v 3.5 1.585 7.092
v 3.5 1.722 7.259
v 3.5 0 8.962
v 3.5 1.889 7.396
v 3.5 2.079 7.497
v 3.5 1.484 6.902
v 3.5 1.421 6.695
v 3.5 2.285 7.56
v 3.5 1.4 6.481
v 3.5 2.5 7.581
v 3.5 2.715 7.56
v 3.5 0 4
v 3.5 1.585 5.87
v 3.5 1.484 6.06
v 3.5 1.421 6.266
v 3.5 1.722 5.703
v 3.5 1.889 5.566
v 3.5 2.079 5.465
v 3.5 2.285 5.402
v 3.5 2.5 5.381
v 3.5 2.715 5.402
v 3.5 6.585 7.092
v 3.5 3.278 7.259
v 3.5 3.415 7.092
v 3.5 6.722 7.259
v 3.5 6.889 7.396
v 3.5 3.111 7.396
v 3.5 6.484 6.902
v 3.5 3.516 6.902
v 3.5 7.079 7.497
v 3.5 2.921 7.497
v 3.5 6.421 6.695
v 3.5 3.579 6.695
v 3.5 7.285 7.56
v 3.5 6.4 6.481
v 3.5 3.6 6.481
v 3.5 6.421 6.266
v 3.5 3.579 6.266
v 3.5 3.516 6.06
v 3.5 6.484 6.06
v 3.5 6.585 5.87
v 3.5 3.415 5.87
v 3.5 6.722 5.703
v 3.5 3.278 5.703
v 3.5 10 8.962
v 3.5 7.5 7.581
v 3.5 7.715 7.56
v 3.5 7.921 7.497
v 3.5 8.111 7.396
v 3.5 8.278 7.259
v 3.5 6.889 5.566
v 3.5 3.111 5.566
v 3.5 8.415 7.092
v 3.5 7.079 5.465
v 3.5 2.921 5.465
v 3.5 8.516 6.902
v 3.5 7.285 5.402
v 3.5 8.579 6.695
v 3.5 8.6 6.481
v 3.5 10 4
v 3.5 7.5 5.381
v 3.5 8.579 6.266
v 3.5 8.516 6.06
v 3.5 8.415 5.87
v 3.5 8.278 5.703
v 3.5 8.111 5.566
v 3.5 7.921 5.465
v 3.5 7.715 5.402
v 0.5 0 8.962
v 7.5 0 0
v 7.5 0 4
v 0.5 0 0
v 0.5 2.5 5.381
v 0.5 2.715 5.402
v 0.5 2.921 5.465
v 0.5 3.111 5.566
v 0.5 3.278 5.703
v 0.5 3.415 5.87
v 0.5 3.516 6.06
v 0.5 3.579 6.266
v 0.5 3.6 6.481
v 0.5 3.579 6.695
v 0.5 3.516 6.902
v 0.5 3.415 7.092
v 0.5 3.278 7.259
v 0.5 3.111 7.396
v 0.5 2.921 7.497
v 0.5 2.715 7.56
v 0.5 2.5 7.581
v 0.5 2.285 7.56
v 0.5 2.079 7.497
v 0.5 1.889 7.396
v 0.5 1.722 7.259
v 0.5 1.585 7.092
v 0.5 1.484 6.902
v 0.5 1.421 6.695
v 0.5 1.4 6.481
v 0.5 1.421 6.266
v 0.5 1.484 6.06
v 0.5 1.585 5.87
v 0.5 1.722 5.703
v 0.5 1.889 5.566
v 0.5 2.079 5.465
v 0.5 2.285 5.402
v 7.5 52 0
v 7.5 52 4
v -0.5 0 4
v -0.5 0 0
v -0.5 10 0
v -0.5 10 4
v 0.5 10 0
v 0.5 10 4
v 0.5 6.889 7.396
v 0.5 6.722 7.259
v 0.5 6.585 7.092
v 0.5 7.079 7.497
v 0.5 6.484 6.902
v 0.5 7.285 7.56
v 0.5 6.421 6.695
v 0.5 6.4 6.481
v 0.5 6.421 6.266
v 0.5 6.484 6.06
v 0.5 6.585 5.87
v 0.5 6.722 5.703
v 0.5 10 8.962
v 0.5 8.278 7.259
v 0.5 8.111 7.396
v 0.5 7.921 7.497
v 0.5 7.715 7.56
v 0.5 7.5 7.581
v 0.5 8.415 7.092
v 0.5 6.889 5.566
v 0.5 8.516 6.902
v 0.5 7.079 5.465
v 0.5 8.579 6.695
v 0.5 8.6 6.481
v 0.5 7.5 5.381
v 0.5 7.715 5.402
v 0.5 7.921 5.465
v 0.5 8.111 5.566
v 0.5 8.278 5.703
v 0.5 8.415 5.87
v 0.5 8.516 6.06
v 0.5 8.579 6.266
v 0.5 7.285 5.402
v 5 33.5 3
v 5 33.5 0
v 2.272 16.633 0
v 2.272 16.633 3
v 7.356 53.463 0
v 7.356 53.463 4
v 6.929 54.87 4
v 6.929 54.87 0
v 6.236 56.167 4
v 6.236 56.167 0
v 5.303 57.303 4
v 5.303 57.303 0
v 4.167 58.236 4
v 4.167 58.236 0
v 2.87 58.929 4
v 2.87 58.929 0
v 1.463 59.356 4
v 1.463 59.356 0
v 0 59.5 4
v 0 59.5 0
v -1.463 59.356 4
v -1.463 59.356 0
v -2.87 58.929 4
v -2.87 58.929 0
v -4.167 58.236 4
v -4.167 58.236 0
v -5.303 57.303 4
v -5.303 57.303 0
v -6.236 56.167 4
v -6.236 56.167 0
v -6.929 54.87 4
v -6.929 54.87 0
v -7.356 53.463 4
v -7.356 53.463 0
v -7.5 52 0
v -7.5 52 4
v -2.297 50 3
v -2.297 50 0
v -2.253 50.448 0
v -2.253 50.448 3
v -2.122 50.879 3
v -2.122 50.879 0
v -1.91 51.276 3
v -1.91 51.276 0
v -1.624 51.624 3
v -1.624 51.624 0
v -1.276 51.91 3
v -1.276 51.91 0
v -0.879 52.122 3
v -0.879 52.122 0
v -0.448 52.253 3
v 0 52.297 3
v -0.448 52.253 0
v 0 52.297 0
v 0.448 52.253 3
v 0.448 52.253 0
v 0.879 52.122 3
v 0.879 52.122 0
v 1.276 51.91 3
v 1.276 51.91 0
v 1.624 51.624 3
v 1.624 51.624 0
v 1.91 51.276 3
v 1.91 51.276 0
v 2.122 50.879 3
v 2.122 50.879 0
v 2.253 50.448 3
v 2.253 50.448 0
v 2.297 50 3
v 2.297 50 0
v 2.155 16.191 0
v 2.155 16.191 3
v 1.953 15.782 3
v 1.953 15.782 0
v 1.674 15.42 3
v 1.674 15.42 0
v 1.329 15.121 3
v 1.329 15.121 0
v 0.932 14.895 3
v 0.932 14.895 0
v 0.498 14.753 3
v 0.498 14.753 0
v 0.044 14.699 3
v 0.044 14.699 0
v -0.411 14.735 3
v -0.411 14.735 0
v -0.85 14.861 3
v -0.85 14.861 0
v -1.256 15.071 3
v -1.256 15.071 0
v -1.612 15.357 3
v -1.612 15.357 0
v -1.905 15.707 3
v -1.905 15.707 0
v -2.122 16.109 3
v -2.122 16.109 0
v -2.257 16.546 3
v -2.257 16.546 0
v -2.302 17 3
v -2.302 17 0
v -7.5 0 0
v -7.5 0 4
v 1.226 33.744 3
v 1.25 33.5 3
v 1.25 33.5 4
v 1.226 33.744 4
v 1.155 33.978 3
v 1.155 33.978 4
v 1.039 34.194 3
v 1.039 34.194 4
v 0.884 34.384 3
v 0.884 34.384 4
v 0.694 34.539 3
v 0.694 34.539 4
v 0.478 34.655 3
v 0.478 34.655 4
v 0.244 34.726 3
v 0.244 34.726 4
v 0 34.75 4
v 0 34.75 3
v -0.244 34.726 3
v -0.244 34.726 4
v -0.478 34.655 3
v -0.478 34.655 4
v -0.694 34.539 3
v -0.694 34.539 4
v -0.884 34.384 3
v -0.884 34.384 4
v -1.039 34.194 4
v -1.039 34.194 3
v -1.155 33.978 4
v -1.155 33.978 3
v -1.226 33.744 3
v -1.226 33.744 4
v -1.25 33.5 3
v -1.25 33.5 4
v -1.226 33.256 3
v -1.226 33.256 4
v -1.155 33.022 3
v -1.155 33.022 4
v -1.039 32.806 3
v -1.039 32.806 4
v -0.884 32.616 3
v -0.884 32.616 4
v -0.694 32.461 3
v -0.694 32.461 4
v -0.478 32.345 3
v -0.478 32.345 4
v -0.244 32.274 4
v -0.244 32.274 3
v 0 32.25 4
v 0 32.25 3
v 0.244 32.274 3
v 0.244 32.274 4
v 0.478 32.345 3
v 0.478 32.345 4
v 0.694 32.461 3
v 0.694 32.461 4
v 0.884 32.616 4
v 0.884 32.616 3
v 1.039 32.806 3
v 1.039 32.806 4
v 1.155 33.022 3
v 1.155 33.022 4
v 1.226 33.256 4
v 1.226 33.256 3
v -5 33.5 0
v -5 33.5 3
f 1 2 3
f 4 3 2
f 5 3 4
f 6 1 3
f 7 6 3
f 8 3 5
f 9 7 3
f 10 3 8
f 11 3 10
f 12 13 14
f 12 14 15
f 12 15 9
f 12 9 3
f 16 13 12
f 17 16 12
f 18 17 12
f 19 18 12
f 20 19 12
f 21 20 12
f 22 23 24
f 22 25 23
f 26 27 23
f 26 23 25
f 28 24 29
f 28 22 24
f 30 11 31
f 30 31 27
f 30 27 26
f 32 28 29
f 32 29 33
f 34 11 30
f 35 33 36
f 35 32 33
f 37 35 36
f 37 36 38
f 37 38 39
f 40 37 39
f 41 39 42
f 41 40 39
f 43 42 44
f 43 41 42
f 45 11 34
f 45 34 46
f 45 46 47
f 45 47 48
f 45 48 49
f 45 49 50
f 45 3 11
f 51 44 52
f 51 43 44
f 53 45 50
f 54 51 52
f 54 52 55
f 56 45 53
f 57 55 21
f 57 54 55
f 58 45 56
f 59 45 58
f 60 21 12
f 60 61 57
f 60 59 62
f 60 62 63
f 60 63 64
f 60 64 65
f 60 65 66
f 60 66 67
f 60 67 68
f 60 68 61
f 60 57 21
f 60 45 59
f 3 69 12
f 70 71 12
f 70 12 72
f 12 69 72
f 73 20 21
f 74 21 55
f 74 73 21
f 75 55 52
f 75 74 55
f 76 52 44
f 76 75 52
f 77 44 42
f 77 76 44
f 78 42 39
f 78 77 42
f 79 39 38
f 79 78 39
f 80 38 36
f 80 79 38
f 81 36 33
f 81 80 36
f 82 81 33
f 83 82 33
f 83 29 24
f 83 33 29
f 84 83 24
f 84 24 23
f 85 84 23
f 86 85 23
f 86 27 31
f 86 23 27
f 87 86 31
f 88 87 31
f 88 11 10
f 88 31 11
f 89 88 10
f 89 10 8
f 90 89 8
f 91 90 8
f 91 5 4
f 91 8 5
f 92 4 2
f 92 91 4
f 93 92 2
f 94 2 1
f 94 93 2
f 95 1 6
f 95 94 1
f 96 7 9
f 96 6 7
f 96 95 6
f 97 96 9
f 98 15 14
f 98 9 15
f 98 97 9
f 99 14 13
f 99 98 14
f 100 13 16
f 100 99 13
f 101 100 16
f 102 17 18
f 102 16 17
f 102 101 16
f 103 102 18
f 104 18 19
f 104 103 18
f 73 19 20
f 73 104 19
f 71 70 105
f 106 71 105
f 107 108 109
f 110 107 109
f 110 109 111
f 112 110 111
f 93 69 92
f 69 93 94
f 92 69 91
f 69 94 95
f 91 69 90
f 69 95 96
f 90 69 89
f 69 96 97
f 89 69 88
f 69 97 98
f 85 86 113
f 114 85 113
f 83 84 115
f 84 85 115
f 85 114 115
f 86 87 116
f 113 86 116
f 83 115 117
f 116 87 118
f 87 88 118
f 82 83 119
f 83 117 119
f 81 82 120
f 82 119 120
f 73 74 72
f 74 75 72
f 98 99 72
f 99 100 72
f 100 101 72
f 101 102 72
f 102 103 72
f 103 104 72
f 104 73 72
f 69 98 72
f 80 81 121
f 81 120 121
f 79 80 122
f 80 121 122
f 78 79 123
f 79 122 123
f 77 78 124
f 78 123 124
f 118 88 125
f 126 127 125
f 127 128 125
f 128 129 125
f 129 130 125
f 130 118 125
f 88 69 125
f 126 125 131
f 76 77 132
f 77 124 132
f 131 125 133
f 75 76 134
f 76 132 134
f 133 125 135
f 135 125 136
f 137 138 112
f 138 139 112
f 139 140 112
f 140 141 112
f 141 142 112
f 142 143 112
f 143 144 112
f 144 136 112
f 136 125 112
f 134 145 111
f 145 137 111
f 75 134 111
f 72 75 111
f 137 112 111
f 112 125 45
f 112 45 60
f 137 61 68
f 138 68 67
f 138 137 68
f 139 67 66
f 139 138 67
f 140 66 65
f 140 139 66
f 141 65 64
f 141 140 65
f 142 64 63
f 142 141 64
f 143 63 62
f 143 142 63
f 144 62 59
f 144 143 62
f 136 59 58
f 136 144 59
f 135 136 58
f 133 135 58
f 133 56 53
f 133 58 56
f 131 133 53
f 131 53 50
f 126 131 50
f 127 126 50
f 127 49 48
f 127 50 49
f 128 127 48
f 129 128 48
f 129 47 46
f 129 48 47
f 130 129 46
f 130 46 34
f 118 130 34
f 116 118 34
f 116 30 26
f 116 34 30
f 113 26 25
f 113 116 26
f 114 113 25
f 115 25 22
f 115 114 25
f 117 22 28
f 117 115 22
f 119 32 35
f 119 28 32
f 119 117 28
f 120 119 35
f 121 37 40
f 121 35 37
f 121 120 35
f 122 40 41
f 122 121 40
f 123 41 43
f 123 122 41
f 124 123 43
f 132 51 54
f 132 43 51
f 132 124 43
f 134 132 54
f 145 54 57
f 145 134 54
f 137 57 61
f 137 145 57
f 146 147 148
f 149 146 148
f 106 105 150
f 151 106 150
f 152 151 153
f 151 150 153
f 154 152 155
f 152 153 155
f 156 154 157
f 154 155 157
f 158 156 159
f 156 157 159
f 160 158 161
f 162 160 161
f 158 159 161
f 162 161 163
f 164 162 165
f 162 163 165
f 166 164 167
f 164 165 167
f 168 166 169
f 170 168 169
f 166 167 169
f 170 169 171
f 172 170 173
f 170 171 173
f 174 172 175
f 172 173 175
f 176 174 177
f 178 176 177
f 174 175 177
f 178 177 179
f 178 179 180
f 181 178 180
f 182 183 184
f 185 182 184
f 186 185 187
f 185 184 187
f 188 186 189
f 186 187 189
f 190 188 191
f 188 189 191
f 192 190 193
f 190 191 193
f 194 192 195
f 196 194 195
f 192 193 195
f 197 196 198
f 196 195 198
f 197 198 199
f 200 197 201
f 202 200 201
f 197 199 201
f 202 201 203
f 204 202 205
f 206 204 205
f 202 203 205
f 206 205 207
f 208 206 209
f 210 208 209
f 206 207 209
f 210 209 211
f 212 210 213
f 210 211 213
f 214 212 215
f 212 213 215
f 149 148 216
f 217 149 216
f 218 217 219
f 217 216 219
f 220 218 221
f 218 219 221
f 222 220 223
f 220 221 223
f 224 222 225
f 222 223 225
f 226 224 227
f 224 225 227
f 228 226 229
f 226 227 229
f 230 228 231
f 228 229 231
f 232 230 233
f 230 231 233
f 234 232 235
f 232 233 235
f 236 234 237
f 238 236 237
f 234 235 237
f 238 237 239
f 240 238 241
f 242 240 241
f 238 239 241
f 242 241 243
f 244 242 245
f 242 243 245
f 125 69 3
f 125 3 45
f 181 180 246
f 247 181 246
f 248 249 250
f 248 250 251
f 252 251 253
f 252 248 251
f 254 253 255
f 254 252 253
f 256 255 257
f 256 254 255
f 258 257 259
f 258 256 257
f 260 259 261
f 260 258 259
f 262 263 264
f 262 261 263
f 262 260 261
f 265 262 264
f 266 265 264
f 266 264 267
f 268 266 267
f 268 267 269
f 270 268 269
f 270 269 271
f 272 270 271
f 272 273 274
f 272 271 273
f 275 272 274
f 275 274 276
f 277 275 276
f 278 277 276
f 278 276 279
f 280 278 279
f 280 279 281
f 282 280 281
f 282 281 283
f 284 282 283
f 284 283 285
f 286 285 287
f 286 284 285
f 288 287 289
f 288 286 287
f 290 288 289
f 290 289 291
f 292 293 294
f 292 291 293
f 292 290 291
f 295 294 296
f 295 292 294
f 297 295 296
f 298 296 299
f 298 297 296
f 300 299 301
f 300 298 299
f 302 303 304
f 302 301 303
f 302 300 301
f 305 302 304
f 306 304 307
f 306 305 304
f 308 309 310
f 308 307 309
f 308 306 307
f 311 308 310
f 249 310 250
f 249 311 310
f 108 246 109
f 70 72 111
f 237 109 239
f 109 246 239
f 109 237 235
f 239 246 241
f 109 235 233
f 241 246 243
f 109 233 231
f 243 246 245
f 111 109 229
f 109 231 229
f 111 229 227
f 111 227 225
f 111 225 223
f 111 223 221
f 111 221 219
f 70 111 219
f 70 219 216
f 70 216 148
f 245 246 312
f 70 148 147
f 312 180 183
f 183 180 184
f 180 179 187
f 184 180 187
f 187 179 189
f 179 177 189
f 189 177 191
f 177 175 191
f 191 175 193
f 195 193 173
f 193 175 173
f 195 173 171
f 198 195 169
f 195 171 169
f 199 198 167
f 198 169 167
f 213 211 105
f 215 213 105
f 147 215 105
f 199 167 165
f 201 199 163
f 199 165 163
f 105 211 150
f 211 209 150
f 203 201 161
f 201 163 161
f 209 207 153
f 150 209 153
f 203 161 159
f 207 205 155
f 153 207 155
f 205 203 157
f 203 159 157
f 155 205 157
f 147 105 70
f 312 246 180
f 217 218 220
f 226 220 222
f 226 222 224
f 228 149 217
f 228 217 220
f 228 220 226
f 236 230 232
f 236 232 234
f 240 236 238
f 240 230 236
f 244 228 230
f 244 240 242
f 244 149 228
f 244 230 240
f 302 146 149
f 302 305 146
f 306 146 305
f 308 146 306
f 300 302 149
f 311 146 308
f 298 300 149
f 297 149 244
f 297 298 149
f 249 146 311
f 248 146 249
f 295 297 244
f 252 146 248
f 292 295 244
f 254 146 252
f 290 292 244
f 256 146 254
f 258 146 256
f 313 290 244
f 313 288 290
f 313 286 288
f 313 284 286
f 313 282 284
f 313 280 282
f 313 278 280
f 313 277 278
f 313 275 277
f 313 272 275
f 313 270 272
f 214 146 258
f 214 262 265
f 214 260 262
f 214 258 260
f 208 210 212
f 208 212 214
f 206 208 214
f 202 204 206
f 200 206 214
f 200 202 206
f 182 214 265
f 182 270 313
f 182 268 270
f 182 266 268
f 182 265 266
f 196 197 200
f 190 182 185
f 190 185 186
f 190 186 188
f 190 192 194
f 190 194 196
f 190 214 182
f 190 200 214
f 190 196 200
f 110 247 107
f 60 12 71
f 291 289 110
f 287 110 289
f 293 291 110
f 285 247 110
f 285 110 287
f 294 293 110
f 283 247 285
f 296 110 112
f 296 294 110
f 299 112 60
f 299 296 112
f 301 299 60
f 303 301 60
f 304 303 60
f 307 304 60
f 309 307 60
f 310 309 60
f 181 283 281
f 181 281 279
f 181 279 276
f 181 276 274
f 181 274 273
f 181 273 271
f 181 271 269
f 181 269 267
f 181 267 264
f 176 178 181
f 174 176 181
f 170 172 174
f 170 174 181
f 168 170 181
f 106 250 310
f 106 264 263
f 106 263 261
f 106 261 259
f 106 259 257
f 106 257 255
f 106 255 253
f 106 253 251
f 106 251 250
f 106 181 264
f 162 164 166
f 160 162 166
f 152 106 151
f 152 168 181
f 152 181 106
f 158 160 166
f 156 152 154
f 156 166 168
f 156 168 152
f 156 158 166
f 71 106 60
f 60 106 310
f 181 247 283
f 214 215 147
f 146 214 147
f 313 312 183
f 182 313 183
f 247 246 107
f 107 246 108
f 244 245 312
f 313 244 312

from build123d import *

# Parameters (mm, degrees)
EXTRUDE_1_DEPTH     = 4
CUT_EXTRUDE_1_DEPTH = 3
SKETCH_5_R          = 1.25
CUT_EXTRUDE_2_DEPTH = 12.4
SKETCH_6_W          = 1
SKETCH_6_H          = 10
CUT_EXTRUDE_3_DEPTH = 16.3
SKETCH_9_W          = 5
SKETCH_9_H          = 10
EXTRUDE_4_DEPTH     = 3
SKETCH_10_R         = 1.1
CUT_EXTRUDE_4_DEPTH = 5.1


with BuildPart() as part:
    # 草圖1 → 填料-伸長1 (new body)
    with BuildSketch(Plane.XY):
        with BuildLine():
            Line((7.5, 0), (7.5, 52))
            ThreePointArc((7.5, 52), (0, 59.5), (-7.5, 52))
            Line((-7.5, 52), (-7.5, 0))
            Line((-7.5, 0), (7.5, 0))
        make_face()
    extrude(amount=EXTRUDE_1_DEPTH)

    # 草圖3 → 除料-伸長1 (cut)
    with BuildSketch(Plane.XY):
        with BuildLine():
            ThreePointArc((-2.296635758, 50), (0, 52.296635758), (2.296635758, 50))
            Line((2.296635758, 50), (5, 33.5))
            Line((5, 33.5), (2.272331993, 16.632537074))
            ThreePointArc((2.272331993, 16.632537074), (-0.184323371, 14.705540024), (-2.301851795, 17))
            Line((-2.301851795, 17), (-5, 33.5))
            Line((-5, 33.5), (-2.296635758, 50))
        make_face()
    extrude(amount=CUT_EXTRUDE_1_DEPTH, mode=Mode.SUBTRACT)

    # 草圖5 → 除料-伸長2 (cut)
    with BuildSketch(Plane.XY):
        with Locations((0, 33.5)):
            Circle(SKETCH_5_R)
    extrude(amount=CUT_EXTRUDE_2_DEPTH, mode=Mode.SUBTRACT)

    # 草圖6 → 除料-伸長3 (cut)
    with BuildSketch(Plane.XY):
        with Locations((0, 5)):
            Rectangle(SKETCH_6_W, SKETCH_6_H)
    extrude(amount=CUT_EXTRUDE_3_DEPTH, mode=Mode.SUBTRACT)

    # 草圖9 → 填料-伸長4 (add)
    with BuildSketch(Plane(origin=(0.5, 0, 0), x_dir=(0, 0, -1), z_dir=(1, 0, 0))):
        with Locations((-6.46178466, 5)):
            Rectangle(SKETCH_9_W, SKETCH_9_H)
    extrude(amount=EXTRUDE_4_DEPTH)

    # 草圖10 → 除料-伸長4 (cut)
    with BuildSketch(Plane(origin=(0.5, 0, 0), x_dir=(0, 0, -1), z_dir=(1, 0, 0))):
        with Locations((-6.48089233, 7.5)):
            Circle(SKETCH_10_R)
        with Locations((-6.48089233, 2.5)):
            Circle(SKETCH_10_R)
    extrude(amount=CUT_EXTRUDE_4_DEPTH, mode=Mode.SUBTRACT)


solid = part.part
